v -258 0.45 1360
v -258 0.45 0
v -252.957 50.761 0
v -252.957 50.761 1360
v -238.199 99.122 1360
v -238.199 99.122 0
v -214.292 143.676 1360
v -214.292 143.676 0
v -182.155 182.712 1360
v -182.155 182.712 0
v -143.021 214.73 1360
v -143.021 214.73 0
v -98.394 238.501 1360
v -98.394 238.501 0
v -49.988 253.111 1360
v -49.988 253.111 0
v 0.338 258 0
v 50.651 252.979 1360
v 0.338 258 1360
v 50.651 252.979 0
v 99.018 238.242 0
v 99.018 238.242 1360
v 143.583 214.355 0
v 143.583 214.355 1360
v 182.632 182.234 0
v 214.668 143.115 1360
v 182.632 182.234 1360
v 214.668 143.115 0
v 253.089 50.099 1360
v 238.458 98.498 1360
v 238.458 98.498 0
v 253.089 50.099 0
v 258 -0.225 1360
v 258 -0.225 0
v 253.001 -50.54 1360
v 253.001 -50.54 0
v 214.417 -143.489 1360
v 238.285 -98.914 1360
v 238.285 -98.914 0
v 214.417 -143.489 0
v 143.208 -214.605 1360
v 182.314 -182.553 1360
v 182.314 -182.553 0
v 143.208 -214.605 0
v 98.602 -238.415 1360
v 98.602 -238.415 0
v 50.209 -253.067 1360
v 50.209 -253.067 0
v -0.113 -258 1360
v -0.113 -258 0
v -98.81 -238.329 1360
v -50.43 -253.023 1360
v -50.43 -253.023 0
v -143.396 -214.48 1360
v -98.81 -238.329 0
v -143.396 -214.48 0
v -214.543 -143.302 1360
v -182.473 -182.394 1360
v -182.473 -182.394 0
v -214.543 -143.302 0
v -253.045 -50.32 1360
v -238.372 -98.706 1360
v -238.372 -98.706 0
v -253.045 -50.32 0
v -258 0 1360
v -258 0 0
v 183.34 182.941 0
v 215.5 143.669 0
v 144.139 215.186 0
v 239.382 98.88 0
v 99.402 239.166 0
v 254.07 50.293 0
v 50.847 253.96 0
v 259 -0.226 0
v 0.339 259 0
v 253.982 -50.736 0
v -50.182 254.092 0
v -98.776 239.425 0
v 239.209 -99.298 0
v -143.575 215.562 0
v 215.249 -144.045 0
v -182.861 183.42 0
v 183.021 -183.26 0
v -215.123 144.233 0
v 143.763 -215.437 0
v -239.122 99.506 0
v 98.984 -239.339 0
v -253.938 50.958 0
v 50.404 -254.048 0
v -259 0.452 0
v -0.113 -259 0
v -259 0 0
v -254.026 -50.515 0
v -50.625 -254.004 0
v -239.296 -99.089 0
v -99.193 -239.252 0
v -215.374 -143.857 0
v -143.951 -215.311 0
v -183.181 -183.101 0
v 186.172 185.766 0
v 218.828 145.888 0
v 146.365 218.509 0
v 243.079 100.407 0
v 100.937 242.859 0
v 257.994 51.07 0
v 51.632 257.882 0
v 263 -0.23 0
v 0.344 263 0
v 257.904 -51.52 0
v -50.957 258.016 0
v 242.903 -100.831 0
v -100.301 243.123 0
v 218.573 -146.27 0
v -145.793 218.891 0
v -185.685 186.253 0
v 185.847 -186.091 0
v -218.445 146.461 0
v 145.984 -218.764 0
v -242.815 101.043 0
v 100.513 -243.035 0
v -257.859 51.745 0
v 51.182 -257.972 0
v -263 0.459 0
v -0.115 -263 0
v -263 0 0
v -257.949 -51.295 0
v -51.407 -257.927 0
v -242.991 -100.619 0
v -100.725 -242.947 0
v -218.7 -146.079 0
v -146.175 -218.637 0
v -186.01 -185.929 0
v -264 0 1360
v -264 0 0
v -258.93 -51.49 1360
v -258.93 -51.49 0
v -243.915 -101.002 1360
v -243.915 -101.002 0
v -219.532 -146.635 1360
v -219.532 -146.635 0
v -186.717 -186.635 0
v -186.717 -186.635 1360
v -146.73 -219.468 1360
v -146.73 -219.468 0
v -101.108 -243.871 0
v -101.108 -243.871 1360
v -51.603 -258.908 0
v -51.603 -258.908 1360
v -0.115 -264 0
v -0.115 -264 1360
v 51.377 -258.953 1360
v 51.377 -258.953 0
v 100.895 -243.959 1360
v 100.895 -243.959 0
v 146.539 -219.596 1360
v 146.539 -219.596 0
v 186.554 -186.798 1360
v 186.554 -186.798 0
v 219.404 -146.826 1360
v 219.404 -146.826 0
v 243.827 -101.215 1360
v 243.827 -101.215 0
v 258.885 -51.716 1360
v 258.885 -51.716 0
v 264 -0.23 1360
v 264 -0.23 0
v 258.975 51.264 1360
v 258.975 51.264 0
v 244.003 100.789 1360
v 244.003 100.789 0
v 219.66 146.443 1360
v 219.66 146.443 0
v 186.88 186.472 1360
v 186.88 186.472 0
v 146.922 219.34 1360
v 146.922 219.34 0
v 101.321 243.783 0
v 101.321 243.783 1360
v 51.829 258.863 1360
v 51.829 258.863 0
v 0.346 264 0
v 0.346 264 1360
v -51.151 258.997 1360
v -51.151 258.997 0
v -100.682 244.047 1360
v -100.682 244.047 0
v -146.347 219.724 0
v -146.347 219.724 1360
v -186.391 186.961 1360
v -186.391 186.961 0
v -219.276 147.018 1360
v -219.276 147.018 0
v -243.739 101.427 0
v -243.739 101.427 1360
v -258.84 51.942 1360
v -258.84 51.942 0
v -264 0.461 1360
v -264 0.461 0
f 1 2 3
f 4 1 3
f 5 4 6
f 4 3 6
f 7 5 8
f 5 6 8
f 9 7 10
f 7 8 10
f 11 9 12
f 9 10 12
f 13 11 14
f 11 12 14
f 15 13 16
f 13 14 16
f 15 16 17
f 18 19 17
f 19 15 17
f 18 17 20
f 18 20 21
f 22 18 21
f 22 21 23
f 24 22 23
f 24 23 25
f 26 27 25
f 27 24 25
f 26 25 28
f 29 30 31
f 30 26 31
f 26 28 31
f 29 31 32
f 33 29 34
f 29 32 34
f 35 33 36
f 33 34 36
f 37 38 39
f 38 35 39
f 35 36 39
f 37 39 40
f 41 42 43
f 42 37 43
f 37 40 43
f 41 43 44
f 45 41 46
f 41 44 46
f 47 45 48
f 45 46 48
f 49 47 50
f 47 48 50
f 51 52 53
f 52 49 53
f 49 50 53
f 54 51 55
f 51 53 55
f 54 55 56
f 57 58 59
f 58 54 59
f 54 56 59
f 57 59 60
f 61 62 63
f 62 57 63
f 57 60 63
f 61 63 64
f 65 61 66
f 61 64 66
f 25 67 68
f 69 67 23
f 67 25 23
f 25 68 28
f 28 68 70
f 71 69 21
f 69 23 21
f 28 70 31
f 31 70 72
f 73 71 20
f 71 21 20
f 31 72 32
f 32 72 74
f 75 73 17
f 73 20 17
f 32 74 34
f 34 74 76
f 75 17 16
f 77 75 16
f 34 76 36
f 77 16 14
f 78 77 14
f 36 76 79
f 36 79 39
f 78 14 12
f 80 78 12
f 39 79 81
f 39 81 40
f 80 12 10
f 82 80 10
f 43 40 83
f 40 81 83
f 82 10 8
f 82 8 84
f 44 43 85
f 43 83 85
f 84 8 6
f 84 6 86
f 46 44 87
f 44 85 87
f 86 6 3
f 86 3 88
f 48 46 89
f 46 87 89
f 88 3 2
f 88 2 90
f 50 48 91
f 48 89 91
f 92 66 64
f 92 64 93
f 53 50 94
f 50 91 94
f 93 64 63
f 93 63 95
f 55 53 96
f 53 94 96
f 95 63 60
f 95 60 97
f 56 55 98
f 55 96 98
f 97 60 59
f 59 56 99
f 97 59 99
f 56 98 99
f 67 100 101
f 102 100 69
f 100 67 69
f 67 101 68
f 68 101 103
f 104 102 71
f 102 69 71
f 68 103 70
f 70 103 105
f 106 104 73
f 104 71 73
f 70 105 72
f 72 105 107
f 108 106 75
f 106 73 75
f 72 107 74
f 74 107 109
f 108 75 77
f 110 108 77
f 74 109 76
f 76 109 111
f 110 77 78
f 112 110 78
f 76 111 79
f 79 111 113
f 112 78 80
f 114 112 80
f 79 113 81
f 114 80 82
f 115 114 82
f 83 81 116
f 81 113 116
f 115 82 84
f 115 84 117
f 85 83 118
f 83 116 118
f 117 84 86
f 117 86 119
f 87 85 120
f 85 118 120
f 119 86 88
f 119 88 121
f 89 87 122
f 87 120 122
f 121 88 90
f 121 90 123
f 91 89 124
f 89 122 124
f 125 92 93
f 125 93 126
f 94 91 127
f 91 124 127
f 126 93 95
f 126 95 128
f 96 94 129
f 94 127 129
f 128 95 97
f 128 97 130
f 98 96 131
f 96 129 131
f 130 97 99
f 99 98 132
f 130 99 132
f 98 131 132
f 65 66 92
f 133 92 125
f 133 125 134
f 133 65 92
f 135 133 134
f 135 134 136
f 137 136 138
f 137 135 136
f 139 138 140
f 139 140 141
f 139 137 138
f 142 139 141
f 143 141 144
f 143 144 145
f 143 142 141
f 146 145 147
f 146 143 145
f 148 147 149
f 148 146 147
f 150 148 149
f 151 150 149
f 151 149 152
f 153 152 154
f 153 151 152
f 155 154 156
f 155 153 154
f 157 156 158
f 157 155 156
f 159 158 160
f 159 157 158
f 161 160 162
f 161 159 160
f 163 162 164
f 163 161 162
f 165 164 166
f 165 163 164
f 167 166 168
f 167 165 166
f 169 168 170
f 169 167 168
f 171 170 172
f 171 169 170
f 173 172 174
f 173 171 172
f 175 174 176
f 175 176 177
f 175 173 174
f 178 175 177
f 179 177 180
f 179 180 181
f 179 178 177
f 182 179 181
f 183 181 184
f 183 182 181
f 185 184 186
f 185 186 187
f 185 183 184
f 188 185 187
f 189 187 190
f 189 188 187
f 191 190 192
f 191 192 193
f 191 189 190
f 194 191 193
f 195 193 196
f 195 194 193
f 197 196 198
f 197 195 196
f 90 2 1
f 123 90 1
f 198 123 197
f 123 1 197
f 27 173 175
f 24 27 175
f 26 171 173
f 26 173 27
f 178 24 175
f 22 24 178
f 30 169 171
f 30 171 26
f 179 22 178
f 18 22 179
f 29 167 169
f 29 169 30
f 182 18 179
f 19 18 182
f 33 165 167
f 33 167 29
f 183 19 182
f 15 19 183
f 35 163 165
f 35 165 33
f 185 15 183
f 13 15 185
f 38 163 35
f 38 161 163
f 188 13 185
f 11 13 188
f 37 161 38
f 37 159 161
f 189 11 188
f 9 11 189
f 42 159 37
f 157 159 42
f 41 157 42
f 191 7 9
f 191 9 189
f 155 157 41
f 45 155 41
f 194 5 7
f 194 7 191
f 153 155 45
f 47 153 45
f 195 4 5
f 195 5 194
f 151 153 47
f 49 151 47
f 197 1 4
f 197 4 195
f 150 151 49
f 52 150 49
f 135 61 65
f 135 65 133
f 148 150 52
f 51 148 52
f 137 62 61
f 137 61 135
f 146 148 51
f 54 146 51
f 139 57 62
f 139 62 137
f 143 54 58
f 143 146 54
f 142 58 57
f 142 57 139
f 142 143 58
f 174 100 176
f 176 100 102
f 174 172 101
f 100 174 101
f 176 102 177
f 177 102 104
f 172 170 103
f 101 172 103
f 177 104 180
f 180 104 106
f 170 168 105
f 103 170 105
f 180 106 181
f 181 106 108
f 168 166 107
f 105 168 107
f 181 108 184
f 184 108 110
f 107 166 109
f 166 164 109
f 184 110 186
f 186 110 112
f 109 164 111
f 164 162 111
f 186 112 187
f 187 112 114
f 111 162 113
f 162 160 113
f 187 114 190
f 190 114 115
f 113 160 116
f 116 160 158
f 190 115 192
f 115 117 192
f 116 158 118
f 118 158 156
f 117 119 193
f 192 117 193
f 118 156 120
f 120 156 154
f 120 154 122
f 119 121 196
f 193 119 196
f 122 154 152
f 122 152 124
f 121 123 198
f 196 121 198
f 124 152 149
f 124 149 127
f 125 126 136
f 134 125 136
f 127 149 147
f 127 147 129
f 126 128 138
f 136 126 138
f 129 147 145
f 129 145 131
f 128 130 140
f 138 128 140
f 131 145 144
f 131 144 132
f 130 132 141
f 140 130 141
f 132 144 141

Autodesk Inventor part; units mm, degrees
ref_plane "YZ Plane" through (0, 0, 0) normal (1, 0, 0) x (0, 1, 0)
ref_plane "XZ Plane" through (0, 0, 0) normal (0, 1, 0) x (-1, 0, 0)
ref_plane "XY Plane" through (0, 0, 0) normal (0, 0, 1) x (1, 0, 0)
sketch "Sketch1" plane through (0, 0, 0) normal (0, 1, 0) x (-1, 0, 0)
  line L0 (258, 1360) -> (258, 0)
  line L1 (258, 0) -> (264, 0)
  line L2 (0, 0) -> (0, 109.131)
  line L3 (258, 1360) -> (264, 1360)
  line L4 (264, 0) -> (264, 1360)
  line L5 (263, 0) -> (259, 0)
  point P0 (261, 0)
  dimension "d3" = 6
  dimension "d5" = 1360
  dimension "d12" = 528
revolve "Revolution1" add sketch "Sketch1" angle 359.9 about axis through (0, 0, 0) along (0, 0, 1)
sketch "Sketch2" plane through (0, 0, 0) normal (0, 1, 0) x (-1, 0, 0)
  circle A0 centre (0, -706) radius 706
  point P0 (0, 0)
  dimension "d9" = 1412
extrude "Extrusion1" [suppressed]
equation "\"BendRadius\" = Thickness"
equation "\"BendReliefWidth\" = Thickness"
equation "\"BendReliefDepth\" = 0.5 * Thickness"
equation "\"CornerReliefSize\" = 4 * Thickness"
equation "\"MinimumRemnant\" = 2 * Thickness"
equation "\"TransitionRadius\" = BendRadius"
equation "\"JacobiRadiusSize\" = BendRadius"
equation "\"GapSize\" = Thickness"
equation "\"Thickness\" = 6"
properties part number "TZS 0991 accses hatch shell" material "Steel"
